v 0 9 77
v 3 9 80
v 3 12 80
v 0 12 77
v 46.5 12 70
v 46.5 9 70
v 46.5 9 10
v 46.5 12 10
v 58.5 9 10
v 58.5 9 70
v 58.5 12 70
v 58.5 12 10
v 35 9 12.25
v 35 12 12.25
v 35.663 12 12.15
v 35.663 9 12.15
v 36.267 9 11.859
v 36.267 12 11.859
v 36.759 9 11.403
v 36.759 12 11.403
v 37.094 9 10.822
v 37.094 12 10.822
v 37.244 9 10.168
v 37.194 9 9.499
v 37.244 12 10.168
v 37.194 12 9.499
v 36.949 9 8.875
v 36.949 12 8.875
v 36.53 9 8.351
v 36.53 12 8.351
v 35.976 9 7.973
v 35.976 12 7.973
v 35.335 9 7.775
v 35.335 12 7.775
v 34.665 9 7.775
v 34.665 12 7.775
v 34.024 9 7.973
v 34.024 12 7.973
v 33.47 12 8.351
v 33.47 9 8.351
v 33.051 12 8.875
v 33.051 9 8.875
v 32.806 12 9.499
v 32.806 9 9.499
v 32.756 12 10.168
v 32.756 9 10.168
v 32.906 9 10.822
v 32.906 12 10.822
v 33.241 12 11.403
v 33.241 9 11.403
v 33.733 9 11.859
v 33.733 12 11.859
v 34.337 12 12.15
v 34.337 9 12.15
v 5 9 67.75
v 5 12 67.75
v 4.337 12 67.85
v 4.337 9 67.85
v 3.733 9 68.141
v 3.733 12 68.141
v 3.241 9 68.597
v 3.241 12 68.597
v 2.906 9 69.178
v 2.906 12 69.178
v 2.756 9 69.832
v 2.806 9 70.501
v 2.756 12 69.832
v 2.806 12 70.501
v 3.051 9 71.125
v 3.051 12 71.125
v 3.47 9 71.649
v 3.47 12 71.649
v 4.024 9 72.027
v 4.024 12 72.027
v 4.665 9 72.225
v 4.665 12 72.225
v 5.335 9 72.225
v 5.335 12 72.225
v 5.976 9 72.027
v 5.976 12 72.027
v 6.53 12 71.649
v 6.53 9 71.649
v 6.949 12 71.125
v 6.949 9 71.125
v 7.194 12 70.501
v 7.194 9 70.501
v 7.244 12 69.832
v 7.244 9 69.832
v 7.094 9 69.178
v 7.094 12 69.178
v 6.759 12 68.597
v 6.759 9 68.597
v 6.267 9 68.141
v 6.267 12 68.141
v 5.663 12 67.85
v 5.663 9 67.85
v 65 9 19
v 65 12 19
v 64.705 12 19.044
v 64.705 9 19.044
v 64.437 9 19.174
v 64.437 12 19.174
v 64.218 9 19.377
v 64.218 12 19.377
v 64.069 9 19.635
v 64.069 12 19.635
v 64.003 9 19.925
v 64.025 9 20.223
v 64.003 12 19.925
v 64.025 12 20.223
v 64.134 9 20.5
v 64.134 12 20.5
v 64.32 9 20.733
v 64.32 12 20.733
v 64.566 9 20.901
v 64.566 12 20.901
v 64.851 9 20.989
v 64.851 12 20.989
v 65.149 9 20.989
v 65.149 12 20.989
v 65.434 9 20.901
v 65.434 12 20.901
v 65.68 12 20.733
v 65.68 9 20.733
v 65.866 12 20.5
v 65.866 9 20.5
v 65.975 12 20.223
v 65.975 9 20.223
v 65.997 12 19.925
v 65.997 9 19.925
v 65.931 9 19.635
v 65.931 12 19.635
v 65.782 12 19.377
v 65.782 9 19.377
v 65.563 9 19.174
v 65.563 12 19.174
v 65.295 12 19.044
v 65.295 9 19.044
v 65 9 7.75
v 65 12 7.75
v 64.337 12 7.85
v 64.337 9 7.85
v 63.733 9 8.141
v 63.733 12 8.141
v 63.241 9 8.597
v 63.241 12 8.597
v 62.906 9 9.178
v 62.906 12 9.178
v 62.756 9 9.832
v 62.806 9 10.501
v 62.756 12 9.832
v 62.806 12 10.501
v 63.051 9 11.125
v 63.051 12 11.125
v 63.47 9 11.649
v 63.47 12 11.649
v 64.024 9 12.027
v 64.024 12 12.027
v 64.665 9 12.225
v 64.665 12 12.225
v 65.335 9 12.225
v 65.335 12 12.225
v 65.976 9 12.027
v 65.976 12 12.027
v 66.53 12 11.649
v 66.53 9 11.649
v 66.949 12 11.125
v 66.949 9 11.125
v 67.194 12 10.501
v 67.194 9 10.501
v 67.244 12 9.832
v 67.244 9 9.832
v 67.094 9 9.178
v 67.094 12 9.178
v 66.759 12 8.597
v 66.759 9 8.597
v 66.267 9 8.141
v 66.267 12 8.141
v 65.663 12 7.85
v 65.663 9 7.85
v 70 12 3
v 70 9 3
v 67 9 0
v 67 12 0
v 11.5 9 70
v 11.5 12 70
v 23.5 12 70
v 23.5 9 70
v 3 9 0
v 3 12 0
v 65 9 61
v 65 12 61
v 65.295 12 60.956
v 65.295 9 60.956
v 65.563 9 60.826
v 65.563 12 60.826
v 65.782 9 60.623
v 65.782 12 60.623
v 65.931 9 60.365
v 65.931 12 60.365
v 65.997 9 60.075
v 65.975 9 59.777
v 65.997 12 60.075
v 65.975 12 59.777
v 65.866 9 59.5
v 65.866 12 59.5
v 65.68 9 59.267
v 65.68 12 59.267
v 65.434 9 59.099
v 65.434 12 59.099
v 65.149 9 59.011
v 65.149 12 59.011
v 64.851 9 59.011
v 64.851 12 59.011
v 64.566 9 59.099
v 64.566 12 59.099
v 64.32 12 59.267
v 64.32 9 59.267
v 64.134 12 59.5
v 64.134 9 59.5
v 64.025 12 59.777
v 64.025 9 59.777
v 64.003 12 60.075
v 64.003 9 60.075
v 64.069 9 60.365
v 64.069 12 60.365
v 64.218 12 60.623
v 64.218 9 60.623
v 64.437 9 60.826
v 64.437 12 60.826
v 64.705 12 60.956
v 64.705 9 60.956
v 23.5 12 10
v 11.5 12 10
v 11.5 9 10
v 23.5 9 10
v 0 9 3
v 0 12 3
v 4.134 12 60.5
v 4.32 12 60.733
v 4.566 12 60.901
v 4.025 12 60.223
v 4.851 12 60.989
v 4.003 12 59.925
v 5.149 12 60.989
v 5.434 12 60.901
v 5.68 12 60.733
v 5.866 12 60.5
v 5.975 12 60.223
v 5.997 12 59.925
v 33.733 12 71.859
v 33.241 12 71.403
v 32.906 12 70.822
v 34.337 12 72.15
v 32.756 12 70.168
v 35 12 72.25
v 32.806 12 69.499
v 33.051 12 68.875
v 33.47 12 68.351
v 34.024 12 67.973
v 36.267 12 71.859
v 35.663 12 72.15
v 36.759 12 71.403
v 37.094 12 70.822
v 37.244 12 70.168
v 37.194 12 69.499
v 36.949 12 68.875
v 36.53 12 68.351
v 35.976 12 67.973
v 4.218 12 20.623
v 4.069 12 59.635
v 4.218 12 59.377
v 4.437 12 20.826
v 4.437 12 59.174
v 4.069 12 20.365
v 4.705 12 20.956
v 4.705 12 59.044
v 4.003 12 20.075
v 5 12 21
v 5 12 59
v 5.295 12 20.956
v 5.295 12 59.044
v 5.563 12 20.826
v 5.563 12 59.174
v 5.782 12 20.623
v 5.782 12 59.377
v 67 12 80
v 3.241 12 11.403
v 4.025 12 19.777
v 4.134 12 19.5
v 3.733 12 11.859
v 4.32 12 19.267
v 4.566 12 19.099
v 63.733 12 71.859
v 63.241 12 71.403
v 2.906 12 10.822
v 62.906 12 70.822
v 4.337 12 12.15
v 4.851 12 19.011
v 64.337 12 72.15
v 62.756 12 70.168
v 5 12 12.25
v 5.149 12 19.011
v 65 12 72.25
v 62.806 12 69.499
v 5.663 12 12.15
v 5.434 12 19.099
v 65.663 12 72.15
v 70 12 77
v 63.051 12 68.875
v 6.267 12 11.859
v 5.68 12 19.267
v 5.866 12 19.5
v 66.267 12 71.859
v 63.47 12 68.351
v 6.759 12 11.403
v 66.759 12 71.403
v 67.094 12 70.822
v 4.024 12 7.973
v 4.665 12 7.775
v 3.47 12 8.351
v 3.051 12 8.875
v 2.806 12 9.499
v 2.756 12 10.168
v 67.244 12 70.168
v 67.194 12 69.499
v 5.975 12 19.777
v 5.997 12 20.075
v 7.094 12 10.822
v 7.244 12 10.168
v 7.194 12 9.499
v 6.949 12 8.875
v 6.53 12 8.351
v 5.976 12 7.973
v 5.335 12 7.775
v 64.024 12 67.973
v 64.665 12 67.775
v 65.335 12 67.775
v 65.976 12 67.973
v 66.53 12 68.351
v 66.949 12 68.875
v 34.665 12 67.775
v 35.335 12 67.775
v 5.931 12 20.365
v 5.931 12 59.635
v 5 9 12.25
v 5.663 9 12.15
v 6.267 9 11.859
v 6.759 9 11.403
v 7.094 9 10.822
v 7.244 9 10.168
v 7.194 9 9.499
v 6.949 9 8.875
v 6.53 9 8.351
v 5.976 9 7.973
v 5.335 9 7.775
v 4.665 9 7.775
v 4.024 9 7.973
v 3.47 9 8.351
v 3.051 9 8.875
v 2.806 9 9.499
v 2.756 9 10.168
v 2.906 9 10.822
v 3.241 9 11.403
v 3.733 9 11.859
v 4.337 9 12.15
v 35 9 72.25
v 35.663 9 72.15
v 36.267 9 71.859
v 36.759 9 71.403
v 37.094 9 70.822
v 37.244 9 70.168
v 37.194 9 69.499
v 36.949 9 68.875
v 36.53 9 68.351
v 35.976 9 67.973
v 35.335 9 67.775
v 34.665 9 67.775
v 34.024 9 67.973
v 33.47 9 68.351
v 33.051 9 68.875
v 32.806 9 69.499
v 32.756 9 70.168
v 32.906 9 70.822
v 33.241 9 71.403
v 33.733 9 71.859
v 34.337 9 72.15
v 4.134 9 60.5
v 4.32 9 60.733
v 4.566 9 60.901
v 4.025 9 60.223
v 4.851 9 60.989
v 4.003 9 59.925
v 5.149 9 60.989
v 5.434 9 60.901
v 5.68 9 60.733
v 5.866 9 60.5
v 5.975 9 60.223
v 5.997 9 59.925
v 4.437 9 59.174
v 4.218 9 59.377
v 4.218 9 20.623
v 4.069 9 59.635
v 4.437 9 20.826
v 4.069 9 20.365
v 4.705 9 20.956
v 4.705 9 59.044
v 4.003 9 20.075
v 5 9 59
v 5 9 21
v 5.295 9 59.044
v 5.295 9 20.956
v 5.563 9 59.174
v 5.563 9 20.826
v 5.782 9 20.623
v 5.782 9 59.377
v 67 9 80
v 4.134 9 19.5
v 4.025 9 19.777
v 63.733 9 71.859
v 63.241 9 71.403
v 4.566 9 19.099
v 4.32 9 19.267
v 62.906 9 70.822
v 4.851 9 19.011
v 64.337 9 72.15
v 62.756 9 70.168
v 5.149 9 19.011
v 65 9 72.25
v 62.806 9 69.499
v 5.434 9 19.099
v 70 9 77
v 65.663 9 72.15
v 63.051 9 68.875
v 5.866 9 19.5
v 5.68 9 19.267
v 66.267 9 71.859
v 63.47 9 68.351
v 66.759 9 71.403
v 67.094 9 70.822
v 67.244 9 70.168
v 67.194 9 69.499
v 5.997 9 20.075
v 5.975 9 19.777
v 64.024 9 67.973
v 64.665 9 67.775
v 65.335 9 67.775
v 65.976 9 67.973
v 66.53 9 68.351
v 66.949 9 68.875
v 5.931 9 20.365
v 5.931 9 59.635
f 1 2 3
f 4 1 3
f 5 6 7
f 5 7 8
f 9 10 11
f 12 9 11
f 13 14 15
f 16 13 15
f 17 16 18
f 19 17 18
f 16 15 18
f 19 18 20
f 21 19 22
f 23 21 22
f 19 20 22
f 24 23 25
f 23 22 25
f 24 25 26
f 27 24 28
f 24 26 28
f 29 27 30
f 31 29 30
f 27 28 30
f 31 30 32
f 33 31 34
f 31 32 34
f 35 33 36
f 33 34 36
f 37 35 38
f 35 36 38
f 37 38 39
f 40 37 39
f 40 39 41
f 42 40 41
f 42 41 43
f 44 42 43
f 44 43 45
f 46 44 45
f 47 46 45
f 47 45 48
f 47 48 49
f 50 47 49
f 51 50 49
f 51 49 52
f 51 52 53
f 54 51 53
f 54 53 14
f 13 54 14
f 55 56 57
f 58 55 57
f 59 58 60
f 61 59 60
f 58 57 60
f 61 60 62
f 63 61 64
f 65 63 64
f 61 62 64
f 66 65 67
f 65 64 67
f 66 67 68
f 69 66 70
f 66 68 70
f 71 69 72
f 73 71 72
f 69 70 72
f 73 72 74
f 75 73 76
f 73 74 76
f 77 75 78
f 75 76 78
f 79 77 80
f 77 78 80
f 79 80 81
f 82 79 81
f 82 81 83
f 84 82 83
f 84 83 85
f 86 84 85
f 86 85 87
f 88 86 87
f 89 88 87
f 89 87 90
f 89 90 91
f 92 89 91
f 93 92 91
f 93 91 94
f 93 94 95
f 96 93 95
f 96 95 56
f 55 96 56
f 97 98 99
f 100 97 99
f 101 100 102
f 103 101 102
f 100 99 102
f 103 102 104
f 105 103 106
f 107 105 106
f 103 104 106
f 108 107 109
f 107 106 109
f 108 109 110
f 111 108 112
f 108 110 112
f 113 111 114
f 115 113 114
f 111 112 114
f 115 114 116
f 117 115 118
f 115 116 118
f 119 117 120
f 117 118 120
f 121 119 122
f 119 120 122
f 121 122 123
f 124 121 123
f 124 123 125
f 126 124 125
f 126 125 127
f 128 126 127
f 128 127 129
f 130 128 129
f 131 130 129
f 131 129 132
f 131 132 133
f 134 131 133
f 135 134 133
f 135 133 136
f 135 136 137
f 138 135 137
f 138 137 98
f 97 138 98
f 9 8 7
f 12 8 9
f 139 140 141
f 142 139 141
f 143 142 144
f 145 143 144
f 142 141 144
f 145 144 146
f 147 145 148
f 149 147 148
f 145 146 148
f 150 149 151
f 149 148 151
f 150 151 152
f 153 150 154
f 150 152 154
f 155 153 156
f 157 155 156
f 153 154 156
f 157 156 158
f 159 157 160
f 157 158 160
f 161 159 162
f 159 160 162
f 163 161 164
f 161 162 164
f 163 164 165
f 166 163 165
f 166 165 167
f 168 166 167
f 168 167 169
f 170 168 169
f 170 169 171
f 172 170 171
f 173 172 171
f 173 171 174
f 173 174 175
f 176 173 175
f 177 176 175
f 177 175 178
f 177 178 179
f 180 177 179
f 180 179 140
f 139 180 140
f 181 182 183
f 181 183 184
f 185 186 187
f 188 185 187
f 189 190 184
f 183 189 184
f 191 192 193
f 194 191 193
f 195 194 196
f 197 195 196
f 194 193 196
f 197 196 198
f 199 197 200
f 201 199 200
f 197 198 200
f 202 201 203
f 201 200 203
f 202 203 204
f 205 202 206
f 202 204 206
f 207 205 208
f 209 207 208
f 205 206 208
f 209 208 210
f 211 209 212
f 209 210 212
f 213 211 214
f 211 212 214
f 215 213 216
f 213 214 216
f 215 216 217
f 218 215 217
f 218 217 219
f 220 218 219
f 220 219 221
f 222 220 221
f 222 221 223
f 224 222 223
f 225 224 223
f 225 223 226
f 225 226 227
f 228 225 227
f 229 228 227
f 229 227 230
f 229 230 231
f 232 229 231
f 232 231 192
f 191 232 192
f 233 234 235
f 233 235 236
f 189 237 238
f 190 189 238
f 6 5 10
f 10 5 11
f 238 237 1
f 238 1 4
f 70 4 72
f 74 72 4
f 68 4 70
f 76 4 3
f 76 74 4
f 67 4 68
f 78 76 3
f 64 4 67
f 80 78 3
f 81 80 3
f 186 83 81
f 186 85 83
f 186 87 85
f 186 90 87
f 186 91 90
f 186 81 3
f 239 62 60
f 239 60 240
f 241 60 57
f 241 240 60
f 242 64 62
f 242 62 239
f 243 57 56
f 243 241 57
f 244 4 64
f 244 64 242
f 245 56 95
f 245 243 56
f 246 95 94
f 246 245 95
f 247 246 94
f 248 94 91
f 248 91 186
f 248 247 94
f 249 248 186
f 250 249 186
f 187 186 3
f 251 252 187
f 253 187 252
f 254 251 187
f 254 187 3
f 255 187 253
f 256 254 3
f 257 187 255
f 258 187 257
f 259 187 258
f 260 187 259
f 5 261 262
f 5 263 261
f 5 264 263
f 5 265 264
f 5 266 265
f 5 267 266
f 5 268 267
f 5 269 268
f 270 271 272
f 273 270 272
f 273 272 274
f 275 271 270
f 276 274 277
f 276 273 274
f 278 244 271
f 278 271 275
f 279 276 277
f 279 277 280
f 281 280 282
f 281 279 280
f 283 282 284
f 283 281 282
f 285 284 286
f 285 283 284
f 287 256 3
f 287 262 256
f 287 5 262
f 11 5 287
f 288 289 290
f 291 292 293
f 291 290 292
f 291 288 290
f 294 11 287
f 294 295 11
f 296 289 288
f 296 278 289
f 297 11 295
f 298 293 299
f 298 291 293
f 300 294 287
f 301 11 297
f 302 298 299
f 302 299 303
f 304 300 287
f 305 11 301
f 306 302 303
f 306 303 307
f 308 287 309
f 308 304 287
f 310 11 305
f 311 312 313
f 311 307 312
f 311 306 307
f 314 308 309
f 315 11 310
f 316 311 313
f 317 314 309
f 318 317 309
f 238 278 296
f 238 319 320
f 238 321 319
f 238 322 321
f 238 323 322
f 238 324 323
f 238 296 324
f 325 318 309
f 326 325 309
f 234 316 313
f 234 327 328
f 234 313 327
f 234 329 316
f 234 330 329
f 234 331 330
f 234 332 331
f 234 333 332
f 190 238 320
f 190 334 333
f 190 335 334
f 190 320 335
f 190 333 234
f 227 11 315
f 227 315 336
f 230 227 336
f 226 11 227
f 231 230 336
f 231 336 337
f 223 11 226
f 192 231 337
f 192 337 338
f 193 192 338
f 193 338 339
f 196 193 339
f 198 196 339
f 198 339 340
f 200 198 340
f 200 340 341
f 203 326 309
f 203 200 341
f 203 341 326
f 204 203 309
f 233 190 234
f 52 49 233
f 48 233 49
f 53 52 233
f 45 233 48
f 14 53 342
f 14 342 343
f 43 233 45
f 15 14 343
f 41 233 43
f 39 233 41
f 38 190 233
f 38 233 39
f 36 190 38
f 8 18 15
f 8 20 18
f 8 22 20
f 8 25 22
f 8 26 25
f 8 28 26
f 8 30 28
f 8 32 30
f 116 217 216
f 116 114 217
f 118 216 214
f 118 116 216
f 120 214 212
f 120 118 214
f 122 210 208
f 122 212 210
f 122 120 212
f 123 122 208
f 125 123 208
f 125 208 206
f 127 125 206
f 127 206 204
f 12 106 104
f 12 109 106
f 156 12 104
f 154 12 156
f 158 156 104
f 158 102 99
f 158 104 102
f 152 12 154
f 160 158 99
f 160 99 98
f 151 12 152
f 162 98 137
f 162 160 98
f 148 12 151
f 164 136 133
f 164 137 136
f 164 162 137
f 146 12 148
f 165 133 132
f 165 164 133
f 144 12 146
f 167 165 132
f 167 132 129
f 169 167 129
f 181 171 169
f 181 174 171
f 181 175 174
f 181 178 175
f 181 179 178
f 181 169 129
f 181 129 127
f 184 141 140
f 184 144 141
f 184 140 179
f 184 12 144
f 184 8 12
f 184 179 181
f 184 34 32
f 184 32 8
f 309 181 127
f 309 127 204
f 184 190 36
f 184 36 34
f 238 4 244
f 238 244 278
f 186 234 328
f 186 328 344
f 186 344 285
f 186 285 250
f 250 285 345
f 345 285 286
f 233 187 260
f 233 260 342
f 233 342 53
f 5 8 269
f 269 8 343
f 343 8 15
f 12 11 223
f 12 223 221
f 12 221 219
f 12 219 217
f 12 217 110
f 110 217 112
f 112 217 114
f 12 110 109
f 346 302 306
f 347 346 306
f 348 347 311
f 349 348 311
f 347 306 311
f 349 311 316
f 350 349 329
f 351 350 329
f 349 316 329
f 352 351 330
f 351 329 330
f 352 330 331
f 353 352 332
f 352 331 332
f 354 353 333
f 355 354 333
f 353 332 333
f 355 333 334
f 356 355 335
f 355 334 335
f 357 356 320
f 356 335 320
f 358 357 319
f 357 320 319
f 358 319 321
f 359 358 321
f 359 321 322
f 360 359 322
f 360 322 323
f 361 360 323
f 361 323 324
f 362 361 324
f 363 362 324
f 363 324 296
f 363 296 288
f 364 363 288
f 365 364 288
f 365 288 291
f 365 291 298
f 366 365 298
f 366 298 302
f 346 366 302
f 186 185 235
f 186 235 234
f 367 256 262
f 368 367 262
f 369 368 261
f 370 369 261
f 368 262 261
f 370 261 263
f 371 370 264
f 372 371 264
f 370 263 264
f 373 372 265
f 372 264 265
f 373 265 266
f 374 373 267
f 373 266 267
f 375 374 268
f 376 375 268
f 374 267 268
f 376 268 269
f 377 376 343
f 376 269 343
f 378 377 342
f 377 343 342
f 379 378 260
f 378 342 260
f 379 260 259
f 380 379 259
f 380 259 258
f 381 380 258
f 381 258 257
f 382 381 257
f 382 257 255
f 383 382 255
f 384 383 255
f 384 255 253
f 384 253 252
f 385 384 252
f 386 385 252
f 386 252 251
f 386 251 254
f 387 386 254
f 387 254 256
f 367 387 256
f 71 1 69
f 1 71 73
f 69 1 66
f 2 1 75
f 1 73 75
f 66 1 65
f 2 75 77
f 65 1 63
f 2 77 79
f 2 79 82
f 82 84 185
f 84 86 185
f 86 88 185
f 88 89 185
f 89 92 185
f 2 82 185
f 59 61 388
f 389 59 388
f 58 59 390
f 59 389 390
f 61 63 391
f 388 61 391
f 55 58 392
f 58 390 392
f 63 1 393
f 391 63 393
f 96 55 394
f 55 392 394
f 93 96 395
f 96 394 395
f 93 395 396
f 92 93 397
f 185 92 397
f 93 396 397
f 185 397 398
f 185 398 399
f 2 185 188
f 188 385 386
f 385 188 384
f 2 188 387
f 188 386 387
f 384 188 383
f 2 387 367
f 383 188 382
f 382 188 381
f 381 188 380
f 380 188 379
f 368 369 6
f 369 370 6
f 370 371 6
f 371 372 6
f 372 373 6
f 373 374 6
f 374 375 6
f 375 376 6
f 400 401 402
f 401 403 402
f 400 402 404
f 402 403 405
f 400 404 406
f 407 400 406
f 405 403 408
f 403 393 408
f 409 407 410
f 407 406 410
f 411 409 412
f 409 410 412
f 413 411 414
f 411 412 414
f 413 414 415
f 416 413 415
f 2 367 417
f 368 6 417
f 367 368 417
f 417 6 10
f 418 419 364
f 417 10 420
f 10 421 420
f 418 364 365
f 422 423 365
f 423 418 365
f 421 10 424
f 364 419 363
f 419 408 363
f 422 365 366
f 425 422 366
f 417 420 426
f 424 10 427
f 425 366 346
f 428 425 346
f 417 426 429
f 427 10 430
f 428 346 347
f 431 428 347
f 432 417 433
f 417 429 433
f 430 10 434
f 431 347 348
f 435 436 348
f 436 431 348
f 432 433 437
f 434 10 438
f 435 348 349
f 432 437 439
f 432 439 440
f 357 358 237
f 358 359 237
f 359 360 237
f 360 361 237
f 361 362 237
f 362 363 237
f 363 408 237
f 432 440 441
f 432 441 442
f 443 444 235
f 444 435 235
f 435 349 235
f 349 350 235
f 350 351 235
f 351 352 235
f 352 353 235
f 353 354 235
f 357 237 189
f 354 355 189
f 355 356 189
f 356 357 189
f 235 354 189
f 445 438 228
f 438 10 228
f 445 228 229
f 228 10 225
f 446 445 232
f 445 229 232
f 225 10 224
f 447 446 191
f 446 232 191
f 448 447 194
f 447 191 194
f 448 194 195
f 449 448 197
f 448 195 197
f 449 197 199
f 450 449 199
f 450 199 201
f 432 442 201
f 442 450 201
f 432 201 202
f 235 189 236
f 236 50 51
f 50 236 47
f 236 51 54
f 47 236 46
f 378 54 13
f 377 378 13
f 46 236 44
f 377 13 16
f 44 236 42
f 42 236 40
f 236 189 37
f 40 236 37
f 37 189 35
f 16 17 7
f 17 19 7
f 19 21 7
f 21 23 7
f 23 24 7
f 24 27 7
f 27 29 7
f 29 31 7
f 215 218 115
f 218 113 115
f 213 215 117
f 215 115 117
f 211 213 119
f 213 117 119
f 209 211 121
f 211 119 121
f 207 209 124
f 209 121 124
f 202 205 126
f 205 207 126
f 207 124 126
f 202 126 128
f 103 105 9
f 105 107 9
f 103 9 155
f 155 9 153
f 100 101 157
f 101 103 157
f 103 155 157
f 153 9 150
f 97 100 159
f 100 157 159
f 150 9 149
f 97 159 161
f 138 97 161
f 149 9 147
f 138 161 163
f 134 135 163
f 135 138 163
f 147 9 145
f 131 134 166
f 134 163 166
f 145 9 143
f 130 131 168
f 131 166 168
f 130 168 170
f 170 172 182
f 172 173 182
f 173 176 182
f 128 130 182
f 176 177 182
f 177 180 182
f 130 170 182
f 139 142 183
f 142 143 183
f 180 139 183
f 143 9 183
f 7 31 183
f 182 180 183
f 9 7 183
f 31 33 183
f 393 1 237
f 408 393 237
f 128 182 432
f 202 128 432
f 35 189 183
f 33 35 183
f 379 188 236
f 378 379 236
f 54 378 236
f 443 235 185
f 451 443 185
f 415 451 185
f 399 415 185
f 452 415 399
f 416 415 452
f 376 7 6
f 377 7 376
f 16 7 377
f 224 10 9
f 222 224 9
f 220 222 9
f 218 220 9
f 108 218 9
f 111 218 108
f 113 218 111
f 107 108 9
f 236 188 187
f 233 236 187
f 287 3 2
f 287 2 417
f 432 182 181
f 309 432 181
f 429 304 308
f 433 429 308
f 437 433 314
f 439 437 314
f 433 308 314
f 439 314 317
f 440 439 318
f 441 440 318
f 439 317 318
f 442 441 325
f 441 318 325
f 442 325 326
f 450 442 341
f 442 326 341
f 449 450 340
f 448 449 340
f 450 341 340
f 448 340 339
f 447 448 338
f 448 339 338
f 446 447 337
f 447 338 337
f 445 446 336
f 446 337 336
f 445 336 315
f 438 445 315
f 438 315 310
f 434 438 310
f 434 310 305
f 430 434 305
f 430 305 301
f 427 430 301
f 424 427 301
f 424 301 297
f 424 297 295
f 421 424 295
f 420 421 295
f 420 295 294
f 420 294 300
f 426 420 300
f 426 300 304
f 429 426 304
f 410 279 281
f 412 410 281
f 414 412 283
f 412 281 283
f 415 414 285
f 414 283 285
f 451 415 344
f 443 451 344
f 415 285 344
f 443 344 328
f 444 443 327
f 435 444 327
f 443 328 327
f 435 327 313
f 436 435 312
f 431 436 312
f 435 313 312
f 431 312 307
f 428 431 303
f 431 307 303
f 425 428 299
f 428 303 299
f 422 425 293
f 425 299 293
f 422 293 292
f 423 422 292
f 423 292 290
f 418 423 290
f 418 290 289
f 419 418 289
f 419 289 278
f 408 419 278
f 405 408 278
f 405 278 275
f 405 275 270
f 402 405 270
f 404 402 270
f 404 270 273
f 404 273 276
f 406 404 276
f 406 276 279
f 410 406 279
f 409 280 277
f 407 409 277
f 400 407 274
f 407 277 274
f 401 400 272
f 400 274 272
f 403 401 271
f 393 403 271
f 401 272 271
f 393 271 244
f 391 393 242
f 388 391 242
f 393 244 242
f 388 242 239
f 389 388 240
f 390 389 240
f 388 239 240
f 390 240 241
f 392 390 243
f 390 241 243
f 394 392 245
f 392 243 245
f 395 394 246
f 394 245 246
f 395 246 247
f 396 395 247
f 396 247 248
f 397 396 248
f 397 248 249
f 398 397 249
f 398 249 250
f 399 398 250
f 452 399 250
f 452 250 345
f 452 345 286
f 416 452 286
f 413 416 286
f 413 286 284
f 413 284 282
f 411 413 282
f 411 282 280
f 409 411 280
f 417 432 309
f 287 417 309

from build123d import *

# Parameters (mm, degrees)
ESQUISSE1_W             = 70
ESQUISSE1_H             = 12
BOSS_EXTRU_1_DEPTH      = 80
ESQUISSE2_W             = 12
ESQUISSE2_H             = 6
ENL_V_MAT_EXTRU_1_DEPTH = 107.976632963
ESQUISSE4_R             = 2.25
ENL_V_MAT_EXTRU_3_DEPTH = 107.976632963
ESQUISSE5_W             = 12
ESQUISSE5_H             = 10
BOSS_EXTRU_2_DEPTH      = 6
CHANFREIN1_SIZE         = 3
ESQUISSE6_R             = 1
ENL_V_MAT_EXTRU_4_DEPTH = 12
ENL_V_START             = -80
ESQUISSE8_W             = 70
ESQUISSE8_H             = 9
ENL_V_MAT_EXTRU_8_DEPTH = 80


with BuildPart() as part:
    # Esquisse1 → Boss.-Extru.1 (new body)
    with BuildSketch(Plane.XY):
        with Locations((35, 6)):
            Rectangle(ESQUISSE1_W, ESQUISSE1_H)
    extrude(amount=BOSS_EXTRU_1_DEPTH)

    # Esquisse2 → Enlèv. mat.-Extru.1 (cut, through all)
    with BuildSketch(Plane.XY.offset(80)):
        with Locations((52.5, 9)):
            Rectangle(ESQUISSE2_W, ESQUISSE2_H)
        with Locations((17.5, 9)):
            Rectangle(ESQUISSE2_W, ESQUISSE2_H)
    extrude(amount=-ENL_V_MAT_EXTRU_1_DEPTH, mode=Mode.SUBTRACT)

    # Esquisse4 → Enlèv. mat.-Extru.3 (cut, through all)
    with BuildSketch(Plane(origin=(0, 12, 0), x_dir=(1, 0, 0), z_dir=(0, 1, 0))):
        with Locations(Location((5, -10, 0), (0, 0, 270))):
            Circle(ESQUISSE4_R)
        with Locations(Location((65, -70, 0), (0, 0, 270))):
            Circle(ESQUISSE4_R)
        with Locations(Location((65, -10, 0), (0, 0, 90))):
            Circle(ESQUISSE4_R)
        with Locations(Location((5, -70, 0), (0, 0, 90))):
            Circle(ESQUISSE4_R)
        with Locations(Location((35, -10, 0), (0, 0, 270))):
            Circle(ESQUISSE4_R)
        with Locations(Location((35, -70, 0), (0, 0, 270))):
            Circle(ESQUISSE4_R)
    extrude(amount=-ENL_V_MAT_EXTRU_3_DEPTH, mode=Mode.SUBTRACT)

    # Esquisse5 → Boss.-Extru.2 (add)
    with BuildSketch(Plane(origin=(0, 12, 0), x_dir=(1, 0, 0), z_dir=(0, 1, 0))):
        with Locations((17.5, -75)):
            Rectangle(ESQUISSE5_W, ESQUISSE5_H)
        with Locations((52.5, -75)):
            Rectangle(ESQUISSE5_W, ESQUISSE5_H)
        with Locations((52.5, -5)):
            Rectangle(ESQUISSE5_W, ESQUISSE5_H)
        with Locations((17.5, -5)):
            Rectangle(ESQUISSE5_W, ESQUISSE5_H)
    extrude(amount=-BOSS_EXTRU_2_DEPTH)

    # Chanfrein1
    chanfrein1_edges = [part.edges().sort_by_distance(p)[0] for p in [
        (70, 6, 80),
        (0, 6, 80),
        (70, 6, 0),
        (0, 6, 0),
    ]]
    chamfer(chanfrein1_edges, length=CHANFREIN1_SIZE)

    # Esquisse6 → Enlèv. mat.-Extru.4 (cut)
    with BuildSketch(Plane(origin=(0, 12, 0), x_dir=(1, 0, 0), z_dir=(0, 1, 0))):
        with Locations(Location((5, -20, 0), (0, 0, 270))):
            Circle(ESQUISSE6_R)
        with Locations(Location((5, -60, 0), (0, 0, 90))):
            Circle(ESQUISSE6_R)
        with Locations(Location((65, -60, 0), (0, 0, 270))):
            Circle(ESQUISSE6_R)
        with Locations(Location((65, -20, 0), (0, 0, 90))):
            Circle(ESQUISSE6_R)
    extrude(amount=-ENL_V_MAT_EXTRU_4_DEPTH, mode=Mode.SUBTRACT)

    # Esquisse8 → Enlèv. mat.-Extru.8 (cut)
    with BuildSketch(Plane.XY.offset(80).offset(ENL_V_START)):
        with Locations((35, 4.5)):
            Rectangle(ESQUISSE8_W, ESQUISSE8_H)
    extrude(amount=ENL_V_MAT_EXTRU_8_DEPTH, mode=Mode.SUBTRACT)


solid = part.part
